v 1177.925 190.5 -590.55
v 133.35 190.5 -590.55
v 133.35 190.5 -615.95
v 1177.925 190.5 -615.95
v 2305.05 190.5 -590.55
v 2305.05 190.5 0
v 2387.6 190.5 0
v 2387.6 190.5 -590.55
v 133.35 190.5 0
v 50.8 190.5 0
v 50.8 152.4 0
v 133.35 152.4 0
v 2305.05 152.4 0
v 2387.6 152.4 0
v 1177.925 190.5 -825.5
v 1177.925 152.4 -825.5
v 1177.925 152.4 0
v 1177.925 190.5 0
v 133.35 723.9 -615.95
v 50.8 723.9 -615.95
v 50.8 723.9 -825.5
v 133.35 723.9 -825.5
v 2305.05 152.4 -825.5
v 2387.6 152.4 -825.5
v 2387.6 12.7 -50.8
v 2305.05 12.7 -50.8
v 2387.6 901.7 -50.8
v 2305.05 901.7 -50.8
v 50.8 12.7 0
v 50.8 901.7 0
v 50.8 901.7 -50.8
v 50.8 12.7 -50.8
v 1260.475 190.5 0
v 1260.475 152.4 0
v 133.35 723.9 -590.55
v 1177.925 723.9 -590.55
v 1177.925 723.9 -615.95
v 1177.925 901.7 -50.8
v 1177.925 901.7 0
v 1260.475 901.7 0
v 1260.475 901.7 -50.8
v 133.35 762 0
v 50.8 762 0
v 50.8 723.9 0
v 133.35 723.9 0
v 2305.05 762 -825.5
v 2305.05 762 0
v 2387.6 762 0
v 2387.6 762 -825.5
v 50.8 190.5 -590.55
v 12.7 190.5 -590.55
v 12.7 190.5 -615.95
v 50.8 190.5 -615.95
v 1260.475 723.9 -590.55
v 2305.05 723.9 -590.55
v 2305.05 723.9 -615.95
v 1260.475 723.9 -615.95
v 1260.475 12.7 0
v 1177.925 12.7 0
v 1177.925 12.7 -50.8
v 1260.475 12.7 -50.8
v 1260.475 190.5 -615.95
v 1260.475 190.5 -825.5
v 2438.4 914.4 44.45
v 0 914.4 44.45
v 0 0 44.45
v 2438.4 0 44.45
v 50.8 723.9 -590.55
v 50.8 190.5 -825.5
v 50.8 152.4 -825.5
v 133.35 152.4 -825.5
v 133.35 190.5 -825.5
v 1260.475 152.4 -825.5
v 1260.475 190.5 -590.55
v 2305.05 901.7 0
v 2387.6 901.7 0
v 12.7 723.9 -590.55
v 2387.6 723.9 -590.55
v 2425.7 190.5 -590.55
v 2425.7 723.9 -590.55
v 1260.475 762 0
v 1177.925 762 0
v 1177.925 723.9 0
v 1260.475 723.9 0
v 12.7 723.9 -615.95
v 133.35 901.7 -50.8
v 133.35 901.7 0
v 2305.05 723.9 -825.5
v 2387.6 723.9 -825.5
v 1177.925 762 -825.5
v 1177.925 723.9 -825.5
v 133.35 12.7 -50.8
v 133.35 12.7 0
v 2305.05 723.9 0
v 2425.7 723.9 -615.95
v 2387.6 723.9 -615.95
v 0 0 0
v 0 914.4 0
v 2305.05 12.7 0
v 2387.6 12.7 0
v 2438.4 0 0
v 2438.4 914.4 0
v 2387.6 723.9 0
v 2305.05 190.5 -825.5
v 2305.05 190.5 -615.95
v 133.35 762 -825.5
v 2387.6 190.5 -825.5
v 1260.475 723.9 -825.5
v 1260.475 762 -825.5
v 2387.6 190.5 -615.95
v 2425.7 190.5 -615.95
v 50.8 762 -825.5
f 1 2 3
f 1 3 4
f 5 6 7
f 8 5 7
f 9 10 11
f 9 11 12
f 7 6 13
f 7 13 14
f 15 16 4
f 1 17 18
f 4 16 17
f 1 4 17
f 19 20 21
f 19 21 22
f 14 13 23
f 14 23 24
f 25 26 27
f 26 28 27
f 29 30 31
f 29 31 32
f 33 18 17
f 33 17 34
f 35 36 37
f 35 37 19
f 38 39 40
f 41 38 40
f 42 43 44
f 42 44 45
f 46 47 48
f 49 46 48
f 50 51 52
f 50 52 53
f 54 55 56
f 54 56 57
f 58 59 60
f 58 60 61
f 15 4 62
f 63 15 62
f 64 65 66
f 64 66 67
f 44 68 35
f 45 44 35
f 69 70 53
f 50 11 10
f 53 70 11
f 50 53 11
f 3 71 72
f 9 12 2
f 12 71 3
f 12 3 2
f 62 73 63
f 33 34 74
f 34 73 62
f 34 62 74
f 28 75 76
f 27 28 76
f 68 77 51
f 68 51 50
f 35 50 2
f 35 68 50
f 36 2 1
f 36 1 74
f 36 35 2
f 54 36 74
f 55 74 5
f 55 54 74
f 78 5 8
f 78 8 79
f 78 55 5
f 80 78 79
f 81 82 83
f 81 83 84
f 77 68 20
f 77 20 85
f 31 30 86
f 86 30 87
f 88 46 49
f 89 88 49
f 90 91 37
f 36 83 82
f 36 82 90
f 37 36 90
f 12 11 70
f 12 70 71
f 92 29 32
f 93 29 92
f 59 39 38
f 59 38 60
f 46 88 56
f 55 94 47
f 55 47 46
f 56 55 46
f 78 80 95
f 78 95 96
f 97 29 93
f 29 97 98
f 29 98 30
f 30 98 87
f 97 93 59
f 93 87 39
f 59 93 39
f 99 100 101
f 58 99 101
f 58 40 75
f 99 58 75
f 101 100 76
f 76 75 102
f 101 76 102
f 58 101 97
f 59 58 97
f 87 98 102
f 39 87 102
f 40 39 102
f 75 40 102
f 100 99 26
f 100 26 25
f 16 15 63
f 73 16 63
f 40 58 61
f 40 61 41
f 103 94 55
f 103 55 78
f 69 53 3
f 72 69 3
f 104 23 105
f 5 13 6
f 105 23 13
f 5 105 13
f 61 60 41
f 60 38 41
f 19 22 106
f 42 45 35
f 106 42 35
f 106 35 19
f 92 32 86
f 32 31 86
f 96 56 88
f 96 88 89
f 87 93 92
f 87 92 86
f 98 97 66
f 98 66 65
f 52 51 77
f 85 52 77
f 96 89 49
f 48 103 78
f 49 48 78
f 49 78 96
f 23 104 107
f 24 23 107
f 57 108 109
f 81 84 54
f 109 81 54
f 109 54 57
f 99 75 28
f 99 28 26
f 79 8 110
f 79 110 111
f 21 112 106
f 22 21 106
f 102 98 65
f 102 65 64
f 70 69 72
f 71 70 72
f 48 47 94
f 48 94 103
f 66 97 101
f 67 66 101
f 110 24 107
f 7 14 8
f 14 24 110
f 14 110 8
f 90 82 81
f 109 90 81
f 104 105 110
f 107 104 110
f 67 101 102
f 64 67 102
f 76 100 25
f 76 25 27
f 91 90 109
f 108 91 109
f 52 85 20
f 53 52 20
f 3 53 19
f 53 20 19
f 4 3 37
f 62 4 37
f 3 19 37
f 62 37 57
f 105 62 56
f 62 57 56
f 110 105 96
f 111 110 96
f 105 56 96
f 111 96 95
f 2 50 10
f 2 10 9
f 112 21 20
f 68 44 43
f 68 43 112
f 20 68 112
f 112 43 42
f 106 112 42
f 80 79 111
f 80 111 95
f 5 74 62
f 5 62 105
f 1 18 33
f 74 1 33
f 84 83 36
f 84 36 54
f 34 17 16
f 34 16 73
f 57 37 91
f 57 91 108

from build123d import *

# Parameters (mm, degrees)
F0_W     = 2438.4
F0_H     = 914.4
F0_W_2   = 82.55
F0_H_2   = 139.7
F0_H_3   = 38.1
F0_H_4   = 533.4
F1_DEPTH = 44.45
F2_DEPTH = 50.8
F3_DEPTH = 825.5
F5_W     = 2171.7
F5_H     = 533.4
F5_W_2   = 82.55
F5_W_3   = 38.1
F6_DEPTH = 25.4


with BuildPart() as f1:
    # F0 (on Top) → F1 (new body)
    with BuildSketch(Plane.XY):
        with Locations((1219.2, 457.2)):
            Rectangle(F0_W, F0_H)
        Polygon((50.8, 762), (50.8, 901.7), (133.35, 901.7), (133.35, 762), (133.35, 723.9), (133.35, 190.5), (133.35, 152.4), (133.35, 12.7), (50.8, 12.7), (50.8, 152.4), (50.8, 190.5), (50.8, 723.9), align=None, mode=Mode.SUBTRACT)
        Polygon((1177.925, 762), (1177.925, 901.7), (1260.475, 901.7), (1260.475, 762), (1260.475, 723.9), (1260.475, 190.5), (1260.475, 152.4), (1260.475, 12.7), (1177.925, 12.7), (1177.925, 152.4), (1177.925, 190.5), (1177.925, 723.9), align=None, mode=Mode.SUBTRACT)
        Polygon((2305.05, 901.7), (2387.6, 901.7), (2387.6, 762), (2387.6, 723.9), (2387.6, 190.5), (2387.6, 152.4), (2387.6, 12.7), (2305.05, 12.7), (2305.05, 152.4), (2305.05, 190.5), (2305.05, 723.9), (2305.05, 762), align=None, mode=Mode.SUBTRACT)
        with Locations((92.075, 831.85)):
            Rectangle(F0_W_2, F0_H_2)
        with Locations((92.075, 742.95)):
            Rectangle(F0_W_2, F0_H_3)
        with Locations((92.075, 457.2)):
            Rectangle(F0_W_2, F0_H_4)
        with Locations((92.075, 171.45)):
            Rectangle(F0_W_2, F0_H_3)
        with Locations((92.075, 82.55)):
            Rectangle(F0_W_2, F0_H_2)
        with Locations((1219.2, 82.55)):
            Rectangle(F0_W_2, F0_H_2)
        with Locations((1219.2, 171.45)):
            Rectangle(F0_W_2, F0_H_3)
        with Locations((1219.2, 457.2)):
            Rectangle(F0_W_2, F0_H_4)
        with Locations((1219.2, 742.95)):
            Rectangle(F0_W_2, F0_H_3)
        with Locations((1219.2, 831.85)):
            Rectangle(F0_W_2, F0_H_2)
        with Locations((2346.325, 831.85)):
            Rectangle(F0_W_2, F0_H_2)
        with Locations((2346.325, 742.95)):
            Rectangle(F0_W_2, F0_H_3)
        with Locations((2346.325, 457.2)):
            Rectangle(F0_W_2, F0_H_4)
        with Locations((2346.325, 171.45)):
            Rectangle(F0_W_2, F0_H_3)
        with Locations((2346.325, 82.55)):
            Rectangle(F0_W_2, F0_H_2)
    extrude(amount=F1_DEPTH)

    # F0 (on Top) → F2 (join)
    with BuildSketch(Plane.XY):
        with Locations((92.075, 82.55)):
            Rectangle(F0_W_2, F0_H_2)
        with Locations((92.075, 171.45)):
            Rectangle(F0_W_2, F0_H_3)
        with Locations((92.075, 457.2)):
            Rectangle(F0_W_2, F0_H_4)
        with Locations((92.075, 742.95)):
            Rectangle(F0_W_2, F0_H_3)
        with Locations((92.075, 831.85)):
            Rectangle(F0_W_2, F0_H_2)
        with Locations((1219.2, 82.55)):
            Rectangle(F0_W_2, F0_H_2)
        with Locations((1219.2, 457.2)):
            Rectangle(F0_W_2, F0_H_4)
        with Locations((1219.2, 171.45)):
            Rectangle(F0_W_2, F0_H_3)
        with Locations((1219.2, 742.95)):
            Rectangle(F0_W_2, F0_H_3)
        with Locations((1219.2, 831.85)):
            Rectangle(F0_W_2, F0_H_2)
        with Locations((2346.325, 82.55)):
            Rectangle(F0_W_2, F0_H_2)
        with Locations((2346.325, 171.45)):
            Rectangle(F0_W_2, F0_H_3)
        with Locations((2346.325, 457.2)):
            Rectangle(F0_W_2, F0_H_4)
        with Locations((2346.325, 742.95)):
            Rectangle(F0_W_2, F0_H_3)
        with Locations((2346.325, 831.85)):
            Rectangle(F0_W_2, F0_H_2)
    extrude(amount=-F2_DEPTH)


with BuildPart() as f3:
    # F0 (on Top) → F3 (new body)
    with BuildSketch(Plane.XY):
        with Locations((92.075, 171.45)):
            Rectangle(F0_W_2, F0_H_3)
    extrude(amount=-F3_DEPTH)



with BuildPart() as f3b:
    # F0 (on Top) → F3, piece 2 (new body)
    with BuildSketch(Plane.XY):
        with Locations((92.075, 742.95)):
            Rectangle(F0_W_2, F0_H_3)
    extrude(amount=-F3_DEPTH)


with BuildPart() as f3c:
    # F0 (on Top) → F3, piece 3 (new body)
    with BuildSketch(Plane.XY):
        with Locations((1219.2, 171.45)):
            Rectangle(F0_W_2, F0_H_3)
    extrude(amount=-F3_DEPTH)


with BuildPart() as f3d:
    # F0 (on Top) → F3, piece 4 (new body)
    with BuildSketch(Plane.XY):
        with Locations((1219.2, 742.95)):
            Rectangle(F0_W_2, F0_H_3)
    extrude(amount=-F3_DEPTH)


with BuildPart() as f3e:
    # F0 (on Top) → F3, piece 5 (new body)
    with BuildSketch(Plane.XY):
        with Locations((2346.325, 171.45)):
            Rectangle(F0_W_2, F0_H_3)
    extrude(amount=-F3_DEPTH)


with BuildPart() as f3f:
    # F0 (on Top) → F3, piece 6 (new body)
    with BuildSketch(Plane.XY):
        with Locations((2346.325, 742.95)):
            Rectangle(F0_W_2, F0_H_3)
    extrude(amount=-F3_DEPTH)


with BuildPart() as f3_1:
    add(f3.part)

    add(f3b.part)  # F6 merges F3b

    add(f3c.part)  # F6 merges F3c

    add(f3d.part)  # F6 merges F3d

    add(f3e.part)  # F6 merges F3e

    add(f3f.part)  # F6 merges F3f
    # F5 (on offset) → F6 (join)
    with BuildSketch(Plane.XY.offset(-590.55)):
        with Locations((1219.2, 457.2)):
            Rectangle(F5_W, F5_H)
        with Locations((92.075, 457.2)):
            Rectangle(F5_W_2, F5_H)
        with Locations((31.75, 457.2)):
            Rectangle(F5_W_3, F5_H)
        with Locations((2346.325, 457.2)):
            Rectangle(F5_W_2, F5_H)
        with Locations((2406.65, 457.2)):
            Rectangle(F5_W_3, F5_H)
    extrude(amount=-F6_DEPTH)


solid = Compound([f1.part, f3_1.part])
